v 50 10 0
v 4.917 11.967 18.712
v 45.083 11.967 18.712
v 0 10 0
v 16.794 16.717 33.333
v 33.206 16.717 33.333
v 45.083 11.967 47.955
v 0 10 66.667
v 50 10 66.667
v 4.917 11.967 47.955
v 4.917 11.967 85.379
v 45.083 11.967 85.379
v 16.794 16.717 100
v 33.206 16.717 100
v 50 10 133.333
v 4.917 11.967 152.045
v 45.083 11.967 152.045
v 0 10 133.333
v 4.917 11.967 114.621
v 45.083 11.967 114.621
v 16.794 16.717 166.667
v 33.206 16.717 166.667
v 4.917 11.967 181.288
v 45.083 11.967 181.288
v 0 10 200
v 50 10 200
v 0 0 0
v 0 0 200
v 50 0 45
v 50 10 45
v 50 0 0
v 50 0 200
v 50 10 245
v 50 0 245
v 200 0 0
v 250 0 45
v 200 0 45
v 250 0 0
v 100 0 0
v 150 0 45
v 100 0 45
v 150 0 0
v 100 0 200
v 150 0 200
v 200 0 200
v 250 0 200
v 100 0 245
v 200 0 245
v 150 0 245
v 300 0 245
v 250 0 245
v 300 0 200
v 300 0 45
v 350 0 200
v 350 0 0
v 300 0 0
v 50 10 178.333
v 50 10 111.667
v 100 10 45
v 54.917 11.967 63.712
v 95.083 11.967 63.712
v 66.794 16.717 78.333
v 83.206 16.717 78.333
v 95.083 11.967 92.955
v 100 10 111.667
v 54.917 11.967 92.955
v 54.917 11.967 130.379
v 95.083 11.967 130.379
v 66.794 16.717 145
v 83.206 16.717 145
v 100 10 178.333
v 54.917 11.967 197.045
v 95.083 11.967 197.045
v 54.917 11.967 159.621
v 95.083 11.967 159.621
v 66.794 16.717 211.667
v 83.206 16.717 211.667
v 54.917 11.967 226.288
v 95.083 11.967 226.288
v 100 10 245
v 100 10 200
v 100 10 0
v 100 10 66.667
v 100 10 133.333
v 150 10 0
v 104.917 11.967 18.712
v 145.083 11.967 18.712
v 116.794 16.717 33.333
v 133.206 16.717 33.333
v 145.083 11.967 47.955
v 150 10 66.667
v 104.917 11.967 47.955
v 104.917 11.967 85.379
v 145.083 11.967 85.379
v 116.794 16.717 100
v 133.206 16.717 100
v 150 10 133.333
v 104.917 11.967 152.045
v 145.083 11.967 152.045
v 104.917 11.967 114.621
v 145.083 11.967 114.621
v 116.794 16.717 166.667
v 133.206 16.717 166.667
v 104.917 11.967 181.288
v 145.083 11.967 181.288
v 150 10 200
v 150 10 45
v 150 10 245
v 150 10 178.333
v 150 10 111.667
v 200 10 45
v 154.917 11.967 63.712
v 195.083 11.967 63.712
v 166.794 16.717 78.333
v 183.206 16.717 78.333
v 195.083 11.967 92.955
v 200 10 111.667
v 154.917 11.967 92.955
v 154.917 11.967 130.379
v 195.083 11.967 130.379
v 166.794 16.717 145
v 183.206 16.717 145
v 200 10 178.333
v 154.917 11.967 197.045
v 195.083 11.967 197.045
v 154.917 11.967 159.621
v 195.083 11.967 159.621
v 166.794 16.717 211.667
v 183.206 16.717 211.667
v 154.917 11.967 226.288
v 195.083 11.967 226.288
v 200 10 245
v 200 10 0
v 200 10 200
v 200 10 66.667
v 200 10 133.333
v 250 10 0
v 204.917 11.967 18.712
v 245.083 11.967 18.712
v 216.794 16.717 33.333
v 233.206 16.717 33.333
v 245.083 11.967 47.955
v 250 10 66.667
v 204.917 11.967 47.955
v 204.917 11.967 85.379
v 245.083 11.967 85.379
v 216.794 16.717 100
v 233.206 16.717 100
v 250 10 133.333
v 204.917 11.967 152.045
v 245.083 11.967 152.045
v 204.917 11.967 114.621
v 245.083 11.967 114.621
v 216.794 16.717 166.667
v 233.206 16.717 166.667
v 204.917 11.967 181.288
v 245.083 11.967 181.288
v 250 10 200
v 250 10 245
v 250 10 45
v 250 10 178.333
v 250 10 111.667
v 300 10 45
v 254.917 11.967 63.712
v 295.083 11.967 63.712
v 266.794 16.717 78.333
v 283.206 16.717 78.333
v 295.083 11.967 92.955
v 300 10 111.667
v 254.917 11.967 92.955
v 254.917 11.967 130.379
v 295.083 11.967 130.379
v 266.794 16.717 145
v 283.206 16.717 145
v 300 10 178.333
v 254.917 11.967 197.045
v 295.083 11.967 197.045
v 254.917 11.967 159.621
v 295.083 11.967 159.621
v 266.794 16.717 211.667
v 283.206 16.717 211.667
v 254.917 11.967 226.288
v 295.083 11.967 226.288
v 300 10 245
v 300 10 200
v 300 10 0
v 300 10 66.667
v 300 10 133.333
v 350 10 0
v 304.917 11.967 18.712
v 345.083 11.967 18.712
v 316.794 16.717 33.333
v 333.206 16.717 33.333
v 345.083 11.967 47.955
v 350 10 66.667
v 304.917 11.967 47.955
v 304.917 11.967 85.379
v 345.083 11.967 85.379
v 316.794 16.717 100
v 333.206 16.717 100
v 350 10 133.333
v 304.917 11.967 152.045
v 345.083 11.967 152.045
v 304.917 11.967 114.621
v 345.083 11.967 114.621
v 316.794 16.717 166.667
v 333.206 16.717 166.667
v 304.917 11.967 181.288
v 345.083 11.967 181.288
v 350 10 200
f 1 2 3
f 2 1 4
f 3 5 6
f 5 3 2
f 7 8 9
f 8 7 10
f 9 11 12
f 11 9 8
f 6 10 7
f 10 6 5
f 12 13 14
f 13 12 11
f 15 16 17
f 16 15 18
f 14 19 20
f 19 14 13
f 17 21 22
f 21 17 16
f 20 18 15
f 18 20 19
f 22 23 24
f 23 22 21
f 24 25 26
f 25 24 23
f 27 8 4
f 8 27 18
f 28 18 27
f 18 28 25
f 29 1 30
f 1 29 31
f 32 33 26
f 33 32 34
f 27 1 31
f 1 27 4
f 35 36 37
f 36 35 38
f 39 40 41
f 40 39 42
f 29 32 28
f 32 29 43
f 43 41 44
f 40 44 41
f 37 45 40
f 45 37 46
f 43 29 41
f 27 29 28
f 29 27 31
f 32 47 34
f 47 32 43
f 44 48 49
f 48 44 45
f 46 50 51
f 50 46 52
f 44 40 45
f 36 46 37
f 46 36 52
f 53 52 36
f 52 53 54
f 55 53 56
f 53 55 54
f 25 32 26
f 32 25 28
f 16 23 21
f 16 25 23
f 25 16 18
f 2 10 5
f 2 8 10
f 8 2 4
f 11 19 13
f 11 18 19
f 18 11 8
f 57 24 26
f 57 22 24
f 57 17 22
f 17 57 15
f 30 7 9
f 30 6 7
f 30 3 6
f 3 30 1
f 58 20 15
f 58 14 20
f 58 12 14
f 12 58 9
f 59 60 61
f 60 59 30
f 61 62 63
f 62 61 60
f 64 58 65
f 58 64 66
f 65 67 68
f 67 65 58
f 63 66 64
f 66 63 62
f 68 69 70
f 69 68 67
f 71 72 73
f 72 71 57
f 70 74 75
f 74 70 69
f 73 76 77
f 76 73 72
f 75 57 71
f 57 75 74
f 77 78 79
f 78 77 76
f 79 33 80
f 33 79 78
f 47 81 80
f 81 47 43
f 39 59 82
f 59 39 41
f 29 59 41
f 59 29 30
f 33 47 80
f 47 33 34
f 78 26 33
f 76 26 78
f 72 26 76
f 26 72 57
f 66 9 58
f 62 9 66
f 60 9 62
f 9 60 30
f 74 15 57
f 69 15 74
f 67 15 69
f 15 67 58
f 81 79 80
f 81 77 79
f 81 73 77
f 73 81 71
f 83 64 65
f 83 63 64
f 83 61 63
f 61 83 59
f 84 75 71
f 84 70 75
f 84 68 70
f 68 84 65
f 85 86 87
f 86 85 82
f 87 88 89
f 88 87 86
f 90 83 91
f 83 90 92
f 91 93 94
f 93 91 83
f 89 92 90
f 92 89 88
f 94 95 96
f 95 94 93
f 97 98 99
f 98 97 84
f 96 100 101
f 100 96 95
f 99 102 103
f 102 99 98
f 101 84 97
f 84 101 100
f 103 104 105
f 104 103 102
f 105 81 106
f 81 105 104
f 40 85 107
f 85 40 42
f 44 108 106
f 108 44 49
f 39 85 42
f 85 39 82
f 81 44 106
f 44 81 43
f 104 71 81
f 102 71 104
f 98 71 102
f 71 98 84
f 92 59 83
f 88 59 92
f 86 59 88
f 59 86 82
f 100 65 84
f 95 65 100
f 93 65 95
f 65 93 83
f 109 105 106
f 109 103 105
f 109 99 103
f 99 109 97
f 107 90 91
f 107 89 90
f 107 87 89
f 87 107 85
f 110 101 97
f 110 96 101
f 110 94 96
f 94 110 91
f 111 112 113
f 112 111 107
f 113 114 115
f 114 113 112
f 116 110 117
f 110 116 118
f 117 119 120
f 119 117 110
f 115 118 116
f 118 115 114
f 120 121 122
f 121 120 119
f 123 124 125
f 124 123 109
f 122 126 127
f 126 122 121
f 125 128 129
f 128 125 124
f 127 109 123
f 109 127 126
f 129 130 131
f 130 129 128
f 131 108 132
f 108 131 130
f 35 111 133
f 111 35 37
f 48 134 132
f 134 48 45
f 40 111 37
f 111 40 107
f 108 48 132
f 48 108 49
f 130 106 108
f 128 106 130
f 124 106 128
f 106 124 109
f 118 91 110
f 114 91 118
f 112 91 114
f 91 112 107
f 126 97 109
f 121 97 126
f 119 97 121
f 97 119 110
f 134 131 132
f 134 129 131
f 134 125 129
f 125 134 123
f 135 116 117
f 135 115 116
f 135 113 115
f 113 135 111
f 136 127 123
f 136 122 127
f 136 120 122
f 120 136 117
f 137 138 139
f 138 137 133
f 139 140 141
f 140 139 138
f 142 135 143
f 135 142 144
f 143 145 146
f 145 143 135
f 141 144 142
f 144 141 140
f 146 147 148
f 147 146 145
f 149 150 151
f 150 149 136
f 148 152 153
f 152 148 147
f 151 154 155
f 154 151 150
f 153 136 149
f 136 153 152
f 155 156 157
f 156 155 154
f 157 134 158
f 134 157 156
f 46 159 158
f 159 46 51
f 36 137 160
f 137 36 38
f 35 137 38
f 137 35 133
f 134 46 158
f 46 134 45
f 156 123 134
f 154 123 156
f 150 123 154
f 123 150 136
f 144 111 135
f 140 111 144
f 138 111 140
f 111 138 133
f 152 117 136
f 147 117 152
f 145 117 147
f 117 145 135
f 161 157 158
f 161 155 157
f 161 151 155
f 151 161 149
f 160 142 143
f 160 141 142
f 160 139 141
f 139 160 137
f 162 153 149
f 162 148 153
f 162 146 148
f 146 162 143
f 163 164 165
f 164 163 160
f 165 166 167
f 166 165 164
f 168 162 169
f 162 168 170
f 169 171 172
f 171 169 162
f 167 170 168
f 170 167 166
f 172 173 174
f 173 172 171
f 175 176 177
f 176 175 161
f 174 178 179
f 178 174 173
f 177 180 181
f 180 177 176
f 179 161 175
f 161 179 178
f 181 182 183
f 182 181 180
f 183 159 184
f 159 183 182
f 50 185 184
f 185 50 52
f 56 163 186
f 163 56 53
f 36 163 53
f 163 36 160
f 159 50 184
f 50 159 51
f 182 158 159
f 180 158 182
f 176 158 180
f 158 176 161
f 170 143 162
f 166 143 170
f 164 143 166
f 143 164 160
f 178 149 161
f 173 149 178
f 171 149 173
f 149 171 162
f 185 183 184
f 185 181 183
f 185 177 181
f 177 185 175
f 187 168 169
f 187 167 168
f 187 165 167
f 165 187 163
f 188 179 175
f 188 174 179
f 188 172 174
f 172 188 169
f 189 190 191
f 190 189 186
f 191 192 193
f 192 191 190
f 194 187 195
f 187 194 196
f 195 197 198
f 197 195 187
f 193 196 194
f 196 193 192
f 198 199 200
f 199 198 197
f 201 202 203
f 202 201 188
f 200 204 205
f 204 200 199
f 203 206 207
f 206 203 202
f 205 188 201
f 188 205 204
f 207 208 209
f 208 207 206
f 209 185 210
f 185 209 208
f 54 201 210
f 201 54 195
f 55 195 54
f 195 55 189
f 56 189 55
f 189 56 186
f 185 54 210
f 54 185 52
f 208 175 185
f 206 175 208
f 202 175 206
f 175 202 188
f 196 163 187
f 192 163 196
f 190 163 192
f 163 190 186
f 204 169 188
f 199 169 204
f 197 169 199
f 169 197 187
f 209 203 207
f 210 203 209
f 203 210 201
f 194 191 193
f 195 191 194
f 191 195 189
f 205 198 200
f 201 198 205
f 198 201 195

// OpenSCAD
width_lane=50;
thickness_base=10;
thickness_top=20;
length_lane=200;
nb_cylinders=3;
//cylinder_radius=(length_lane/nb_cylinders)/2;
cylinder_radius=90;
nb_lanes=6;


bottom_lane=[[0,0],
    [width_lane,0],
    [width_lane,thickness_base],
    [width_lane/2,thickness_top],
    [0,thickness_base]];
module lane() {
difference() {
    linear_extrude(height = length_lane,
            center = false,
            convexity = 0,
            twist = 0) {
        polygon(bottom_lane);
    }

    for (a=[0:nb_cylinders]) {
        echo(a);
        translate([0,
                cylinder_radius+thickness_base,
                (length_lane/nb_cylinders)*a]) {
             rotate(a=[90,0,90]) {
                cylinder(h = width_lane,
                    r1 = cylinder_radius,
                    r2 = cylinder_radius,
                    center = true/false);
            }
        }
    }
}
}


for (a=[0:nb_lanes]) {
    if (a%2==0) {
         translate([a*width_lane,0,0]) {
            lane();
        }
    } else {
         translate([a*width_lane,0,cylinder_radius/2]) {
            lane();
        }
    }
 
}
